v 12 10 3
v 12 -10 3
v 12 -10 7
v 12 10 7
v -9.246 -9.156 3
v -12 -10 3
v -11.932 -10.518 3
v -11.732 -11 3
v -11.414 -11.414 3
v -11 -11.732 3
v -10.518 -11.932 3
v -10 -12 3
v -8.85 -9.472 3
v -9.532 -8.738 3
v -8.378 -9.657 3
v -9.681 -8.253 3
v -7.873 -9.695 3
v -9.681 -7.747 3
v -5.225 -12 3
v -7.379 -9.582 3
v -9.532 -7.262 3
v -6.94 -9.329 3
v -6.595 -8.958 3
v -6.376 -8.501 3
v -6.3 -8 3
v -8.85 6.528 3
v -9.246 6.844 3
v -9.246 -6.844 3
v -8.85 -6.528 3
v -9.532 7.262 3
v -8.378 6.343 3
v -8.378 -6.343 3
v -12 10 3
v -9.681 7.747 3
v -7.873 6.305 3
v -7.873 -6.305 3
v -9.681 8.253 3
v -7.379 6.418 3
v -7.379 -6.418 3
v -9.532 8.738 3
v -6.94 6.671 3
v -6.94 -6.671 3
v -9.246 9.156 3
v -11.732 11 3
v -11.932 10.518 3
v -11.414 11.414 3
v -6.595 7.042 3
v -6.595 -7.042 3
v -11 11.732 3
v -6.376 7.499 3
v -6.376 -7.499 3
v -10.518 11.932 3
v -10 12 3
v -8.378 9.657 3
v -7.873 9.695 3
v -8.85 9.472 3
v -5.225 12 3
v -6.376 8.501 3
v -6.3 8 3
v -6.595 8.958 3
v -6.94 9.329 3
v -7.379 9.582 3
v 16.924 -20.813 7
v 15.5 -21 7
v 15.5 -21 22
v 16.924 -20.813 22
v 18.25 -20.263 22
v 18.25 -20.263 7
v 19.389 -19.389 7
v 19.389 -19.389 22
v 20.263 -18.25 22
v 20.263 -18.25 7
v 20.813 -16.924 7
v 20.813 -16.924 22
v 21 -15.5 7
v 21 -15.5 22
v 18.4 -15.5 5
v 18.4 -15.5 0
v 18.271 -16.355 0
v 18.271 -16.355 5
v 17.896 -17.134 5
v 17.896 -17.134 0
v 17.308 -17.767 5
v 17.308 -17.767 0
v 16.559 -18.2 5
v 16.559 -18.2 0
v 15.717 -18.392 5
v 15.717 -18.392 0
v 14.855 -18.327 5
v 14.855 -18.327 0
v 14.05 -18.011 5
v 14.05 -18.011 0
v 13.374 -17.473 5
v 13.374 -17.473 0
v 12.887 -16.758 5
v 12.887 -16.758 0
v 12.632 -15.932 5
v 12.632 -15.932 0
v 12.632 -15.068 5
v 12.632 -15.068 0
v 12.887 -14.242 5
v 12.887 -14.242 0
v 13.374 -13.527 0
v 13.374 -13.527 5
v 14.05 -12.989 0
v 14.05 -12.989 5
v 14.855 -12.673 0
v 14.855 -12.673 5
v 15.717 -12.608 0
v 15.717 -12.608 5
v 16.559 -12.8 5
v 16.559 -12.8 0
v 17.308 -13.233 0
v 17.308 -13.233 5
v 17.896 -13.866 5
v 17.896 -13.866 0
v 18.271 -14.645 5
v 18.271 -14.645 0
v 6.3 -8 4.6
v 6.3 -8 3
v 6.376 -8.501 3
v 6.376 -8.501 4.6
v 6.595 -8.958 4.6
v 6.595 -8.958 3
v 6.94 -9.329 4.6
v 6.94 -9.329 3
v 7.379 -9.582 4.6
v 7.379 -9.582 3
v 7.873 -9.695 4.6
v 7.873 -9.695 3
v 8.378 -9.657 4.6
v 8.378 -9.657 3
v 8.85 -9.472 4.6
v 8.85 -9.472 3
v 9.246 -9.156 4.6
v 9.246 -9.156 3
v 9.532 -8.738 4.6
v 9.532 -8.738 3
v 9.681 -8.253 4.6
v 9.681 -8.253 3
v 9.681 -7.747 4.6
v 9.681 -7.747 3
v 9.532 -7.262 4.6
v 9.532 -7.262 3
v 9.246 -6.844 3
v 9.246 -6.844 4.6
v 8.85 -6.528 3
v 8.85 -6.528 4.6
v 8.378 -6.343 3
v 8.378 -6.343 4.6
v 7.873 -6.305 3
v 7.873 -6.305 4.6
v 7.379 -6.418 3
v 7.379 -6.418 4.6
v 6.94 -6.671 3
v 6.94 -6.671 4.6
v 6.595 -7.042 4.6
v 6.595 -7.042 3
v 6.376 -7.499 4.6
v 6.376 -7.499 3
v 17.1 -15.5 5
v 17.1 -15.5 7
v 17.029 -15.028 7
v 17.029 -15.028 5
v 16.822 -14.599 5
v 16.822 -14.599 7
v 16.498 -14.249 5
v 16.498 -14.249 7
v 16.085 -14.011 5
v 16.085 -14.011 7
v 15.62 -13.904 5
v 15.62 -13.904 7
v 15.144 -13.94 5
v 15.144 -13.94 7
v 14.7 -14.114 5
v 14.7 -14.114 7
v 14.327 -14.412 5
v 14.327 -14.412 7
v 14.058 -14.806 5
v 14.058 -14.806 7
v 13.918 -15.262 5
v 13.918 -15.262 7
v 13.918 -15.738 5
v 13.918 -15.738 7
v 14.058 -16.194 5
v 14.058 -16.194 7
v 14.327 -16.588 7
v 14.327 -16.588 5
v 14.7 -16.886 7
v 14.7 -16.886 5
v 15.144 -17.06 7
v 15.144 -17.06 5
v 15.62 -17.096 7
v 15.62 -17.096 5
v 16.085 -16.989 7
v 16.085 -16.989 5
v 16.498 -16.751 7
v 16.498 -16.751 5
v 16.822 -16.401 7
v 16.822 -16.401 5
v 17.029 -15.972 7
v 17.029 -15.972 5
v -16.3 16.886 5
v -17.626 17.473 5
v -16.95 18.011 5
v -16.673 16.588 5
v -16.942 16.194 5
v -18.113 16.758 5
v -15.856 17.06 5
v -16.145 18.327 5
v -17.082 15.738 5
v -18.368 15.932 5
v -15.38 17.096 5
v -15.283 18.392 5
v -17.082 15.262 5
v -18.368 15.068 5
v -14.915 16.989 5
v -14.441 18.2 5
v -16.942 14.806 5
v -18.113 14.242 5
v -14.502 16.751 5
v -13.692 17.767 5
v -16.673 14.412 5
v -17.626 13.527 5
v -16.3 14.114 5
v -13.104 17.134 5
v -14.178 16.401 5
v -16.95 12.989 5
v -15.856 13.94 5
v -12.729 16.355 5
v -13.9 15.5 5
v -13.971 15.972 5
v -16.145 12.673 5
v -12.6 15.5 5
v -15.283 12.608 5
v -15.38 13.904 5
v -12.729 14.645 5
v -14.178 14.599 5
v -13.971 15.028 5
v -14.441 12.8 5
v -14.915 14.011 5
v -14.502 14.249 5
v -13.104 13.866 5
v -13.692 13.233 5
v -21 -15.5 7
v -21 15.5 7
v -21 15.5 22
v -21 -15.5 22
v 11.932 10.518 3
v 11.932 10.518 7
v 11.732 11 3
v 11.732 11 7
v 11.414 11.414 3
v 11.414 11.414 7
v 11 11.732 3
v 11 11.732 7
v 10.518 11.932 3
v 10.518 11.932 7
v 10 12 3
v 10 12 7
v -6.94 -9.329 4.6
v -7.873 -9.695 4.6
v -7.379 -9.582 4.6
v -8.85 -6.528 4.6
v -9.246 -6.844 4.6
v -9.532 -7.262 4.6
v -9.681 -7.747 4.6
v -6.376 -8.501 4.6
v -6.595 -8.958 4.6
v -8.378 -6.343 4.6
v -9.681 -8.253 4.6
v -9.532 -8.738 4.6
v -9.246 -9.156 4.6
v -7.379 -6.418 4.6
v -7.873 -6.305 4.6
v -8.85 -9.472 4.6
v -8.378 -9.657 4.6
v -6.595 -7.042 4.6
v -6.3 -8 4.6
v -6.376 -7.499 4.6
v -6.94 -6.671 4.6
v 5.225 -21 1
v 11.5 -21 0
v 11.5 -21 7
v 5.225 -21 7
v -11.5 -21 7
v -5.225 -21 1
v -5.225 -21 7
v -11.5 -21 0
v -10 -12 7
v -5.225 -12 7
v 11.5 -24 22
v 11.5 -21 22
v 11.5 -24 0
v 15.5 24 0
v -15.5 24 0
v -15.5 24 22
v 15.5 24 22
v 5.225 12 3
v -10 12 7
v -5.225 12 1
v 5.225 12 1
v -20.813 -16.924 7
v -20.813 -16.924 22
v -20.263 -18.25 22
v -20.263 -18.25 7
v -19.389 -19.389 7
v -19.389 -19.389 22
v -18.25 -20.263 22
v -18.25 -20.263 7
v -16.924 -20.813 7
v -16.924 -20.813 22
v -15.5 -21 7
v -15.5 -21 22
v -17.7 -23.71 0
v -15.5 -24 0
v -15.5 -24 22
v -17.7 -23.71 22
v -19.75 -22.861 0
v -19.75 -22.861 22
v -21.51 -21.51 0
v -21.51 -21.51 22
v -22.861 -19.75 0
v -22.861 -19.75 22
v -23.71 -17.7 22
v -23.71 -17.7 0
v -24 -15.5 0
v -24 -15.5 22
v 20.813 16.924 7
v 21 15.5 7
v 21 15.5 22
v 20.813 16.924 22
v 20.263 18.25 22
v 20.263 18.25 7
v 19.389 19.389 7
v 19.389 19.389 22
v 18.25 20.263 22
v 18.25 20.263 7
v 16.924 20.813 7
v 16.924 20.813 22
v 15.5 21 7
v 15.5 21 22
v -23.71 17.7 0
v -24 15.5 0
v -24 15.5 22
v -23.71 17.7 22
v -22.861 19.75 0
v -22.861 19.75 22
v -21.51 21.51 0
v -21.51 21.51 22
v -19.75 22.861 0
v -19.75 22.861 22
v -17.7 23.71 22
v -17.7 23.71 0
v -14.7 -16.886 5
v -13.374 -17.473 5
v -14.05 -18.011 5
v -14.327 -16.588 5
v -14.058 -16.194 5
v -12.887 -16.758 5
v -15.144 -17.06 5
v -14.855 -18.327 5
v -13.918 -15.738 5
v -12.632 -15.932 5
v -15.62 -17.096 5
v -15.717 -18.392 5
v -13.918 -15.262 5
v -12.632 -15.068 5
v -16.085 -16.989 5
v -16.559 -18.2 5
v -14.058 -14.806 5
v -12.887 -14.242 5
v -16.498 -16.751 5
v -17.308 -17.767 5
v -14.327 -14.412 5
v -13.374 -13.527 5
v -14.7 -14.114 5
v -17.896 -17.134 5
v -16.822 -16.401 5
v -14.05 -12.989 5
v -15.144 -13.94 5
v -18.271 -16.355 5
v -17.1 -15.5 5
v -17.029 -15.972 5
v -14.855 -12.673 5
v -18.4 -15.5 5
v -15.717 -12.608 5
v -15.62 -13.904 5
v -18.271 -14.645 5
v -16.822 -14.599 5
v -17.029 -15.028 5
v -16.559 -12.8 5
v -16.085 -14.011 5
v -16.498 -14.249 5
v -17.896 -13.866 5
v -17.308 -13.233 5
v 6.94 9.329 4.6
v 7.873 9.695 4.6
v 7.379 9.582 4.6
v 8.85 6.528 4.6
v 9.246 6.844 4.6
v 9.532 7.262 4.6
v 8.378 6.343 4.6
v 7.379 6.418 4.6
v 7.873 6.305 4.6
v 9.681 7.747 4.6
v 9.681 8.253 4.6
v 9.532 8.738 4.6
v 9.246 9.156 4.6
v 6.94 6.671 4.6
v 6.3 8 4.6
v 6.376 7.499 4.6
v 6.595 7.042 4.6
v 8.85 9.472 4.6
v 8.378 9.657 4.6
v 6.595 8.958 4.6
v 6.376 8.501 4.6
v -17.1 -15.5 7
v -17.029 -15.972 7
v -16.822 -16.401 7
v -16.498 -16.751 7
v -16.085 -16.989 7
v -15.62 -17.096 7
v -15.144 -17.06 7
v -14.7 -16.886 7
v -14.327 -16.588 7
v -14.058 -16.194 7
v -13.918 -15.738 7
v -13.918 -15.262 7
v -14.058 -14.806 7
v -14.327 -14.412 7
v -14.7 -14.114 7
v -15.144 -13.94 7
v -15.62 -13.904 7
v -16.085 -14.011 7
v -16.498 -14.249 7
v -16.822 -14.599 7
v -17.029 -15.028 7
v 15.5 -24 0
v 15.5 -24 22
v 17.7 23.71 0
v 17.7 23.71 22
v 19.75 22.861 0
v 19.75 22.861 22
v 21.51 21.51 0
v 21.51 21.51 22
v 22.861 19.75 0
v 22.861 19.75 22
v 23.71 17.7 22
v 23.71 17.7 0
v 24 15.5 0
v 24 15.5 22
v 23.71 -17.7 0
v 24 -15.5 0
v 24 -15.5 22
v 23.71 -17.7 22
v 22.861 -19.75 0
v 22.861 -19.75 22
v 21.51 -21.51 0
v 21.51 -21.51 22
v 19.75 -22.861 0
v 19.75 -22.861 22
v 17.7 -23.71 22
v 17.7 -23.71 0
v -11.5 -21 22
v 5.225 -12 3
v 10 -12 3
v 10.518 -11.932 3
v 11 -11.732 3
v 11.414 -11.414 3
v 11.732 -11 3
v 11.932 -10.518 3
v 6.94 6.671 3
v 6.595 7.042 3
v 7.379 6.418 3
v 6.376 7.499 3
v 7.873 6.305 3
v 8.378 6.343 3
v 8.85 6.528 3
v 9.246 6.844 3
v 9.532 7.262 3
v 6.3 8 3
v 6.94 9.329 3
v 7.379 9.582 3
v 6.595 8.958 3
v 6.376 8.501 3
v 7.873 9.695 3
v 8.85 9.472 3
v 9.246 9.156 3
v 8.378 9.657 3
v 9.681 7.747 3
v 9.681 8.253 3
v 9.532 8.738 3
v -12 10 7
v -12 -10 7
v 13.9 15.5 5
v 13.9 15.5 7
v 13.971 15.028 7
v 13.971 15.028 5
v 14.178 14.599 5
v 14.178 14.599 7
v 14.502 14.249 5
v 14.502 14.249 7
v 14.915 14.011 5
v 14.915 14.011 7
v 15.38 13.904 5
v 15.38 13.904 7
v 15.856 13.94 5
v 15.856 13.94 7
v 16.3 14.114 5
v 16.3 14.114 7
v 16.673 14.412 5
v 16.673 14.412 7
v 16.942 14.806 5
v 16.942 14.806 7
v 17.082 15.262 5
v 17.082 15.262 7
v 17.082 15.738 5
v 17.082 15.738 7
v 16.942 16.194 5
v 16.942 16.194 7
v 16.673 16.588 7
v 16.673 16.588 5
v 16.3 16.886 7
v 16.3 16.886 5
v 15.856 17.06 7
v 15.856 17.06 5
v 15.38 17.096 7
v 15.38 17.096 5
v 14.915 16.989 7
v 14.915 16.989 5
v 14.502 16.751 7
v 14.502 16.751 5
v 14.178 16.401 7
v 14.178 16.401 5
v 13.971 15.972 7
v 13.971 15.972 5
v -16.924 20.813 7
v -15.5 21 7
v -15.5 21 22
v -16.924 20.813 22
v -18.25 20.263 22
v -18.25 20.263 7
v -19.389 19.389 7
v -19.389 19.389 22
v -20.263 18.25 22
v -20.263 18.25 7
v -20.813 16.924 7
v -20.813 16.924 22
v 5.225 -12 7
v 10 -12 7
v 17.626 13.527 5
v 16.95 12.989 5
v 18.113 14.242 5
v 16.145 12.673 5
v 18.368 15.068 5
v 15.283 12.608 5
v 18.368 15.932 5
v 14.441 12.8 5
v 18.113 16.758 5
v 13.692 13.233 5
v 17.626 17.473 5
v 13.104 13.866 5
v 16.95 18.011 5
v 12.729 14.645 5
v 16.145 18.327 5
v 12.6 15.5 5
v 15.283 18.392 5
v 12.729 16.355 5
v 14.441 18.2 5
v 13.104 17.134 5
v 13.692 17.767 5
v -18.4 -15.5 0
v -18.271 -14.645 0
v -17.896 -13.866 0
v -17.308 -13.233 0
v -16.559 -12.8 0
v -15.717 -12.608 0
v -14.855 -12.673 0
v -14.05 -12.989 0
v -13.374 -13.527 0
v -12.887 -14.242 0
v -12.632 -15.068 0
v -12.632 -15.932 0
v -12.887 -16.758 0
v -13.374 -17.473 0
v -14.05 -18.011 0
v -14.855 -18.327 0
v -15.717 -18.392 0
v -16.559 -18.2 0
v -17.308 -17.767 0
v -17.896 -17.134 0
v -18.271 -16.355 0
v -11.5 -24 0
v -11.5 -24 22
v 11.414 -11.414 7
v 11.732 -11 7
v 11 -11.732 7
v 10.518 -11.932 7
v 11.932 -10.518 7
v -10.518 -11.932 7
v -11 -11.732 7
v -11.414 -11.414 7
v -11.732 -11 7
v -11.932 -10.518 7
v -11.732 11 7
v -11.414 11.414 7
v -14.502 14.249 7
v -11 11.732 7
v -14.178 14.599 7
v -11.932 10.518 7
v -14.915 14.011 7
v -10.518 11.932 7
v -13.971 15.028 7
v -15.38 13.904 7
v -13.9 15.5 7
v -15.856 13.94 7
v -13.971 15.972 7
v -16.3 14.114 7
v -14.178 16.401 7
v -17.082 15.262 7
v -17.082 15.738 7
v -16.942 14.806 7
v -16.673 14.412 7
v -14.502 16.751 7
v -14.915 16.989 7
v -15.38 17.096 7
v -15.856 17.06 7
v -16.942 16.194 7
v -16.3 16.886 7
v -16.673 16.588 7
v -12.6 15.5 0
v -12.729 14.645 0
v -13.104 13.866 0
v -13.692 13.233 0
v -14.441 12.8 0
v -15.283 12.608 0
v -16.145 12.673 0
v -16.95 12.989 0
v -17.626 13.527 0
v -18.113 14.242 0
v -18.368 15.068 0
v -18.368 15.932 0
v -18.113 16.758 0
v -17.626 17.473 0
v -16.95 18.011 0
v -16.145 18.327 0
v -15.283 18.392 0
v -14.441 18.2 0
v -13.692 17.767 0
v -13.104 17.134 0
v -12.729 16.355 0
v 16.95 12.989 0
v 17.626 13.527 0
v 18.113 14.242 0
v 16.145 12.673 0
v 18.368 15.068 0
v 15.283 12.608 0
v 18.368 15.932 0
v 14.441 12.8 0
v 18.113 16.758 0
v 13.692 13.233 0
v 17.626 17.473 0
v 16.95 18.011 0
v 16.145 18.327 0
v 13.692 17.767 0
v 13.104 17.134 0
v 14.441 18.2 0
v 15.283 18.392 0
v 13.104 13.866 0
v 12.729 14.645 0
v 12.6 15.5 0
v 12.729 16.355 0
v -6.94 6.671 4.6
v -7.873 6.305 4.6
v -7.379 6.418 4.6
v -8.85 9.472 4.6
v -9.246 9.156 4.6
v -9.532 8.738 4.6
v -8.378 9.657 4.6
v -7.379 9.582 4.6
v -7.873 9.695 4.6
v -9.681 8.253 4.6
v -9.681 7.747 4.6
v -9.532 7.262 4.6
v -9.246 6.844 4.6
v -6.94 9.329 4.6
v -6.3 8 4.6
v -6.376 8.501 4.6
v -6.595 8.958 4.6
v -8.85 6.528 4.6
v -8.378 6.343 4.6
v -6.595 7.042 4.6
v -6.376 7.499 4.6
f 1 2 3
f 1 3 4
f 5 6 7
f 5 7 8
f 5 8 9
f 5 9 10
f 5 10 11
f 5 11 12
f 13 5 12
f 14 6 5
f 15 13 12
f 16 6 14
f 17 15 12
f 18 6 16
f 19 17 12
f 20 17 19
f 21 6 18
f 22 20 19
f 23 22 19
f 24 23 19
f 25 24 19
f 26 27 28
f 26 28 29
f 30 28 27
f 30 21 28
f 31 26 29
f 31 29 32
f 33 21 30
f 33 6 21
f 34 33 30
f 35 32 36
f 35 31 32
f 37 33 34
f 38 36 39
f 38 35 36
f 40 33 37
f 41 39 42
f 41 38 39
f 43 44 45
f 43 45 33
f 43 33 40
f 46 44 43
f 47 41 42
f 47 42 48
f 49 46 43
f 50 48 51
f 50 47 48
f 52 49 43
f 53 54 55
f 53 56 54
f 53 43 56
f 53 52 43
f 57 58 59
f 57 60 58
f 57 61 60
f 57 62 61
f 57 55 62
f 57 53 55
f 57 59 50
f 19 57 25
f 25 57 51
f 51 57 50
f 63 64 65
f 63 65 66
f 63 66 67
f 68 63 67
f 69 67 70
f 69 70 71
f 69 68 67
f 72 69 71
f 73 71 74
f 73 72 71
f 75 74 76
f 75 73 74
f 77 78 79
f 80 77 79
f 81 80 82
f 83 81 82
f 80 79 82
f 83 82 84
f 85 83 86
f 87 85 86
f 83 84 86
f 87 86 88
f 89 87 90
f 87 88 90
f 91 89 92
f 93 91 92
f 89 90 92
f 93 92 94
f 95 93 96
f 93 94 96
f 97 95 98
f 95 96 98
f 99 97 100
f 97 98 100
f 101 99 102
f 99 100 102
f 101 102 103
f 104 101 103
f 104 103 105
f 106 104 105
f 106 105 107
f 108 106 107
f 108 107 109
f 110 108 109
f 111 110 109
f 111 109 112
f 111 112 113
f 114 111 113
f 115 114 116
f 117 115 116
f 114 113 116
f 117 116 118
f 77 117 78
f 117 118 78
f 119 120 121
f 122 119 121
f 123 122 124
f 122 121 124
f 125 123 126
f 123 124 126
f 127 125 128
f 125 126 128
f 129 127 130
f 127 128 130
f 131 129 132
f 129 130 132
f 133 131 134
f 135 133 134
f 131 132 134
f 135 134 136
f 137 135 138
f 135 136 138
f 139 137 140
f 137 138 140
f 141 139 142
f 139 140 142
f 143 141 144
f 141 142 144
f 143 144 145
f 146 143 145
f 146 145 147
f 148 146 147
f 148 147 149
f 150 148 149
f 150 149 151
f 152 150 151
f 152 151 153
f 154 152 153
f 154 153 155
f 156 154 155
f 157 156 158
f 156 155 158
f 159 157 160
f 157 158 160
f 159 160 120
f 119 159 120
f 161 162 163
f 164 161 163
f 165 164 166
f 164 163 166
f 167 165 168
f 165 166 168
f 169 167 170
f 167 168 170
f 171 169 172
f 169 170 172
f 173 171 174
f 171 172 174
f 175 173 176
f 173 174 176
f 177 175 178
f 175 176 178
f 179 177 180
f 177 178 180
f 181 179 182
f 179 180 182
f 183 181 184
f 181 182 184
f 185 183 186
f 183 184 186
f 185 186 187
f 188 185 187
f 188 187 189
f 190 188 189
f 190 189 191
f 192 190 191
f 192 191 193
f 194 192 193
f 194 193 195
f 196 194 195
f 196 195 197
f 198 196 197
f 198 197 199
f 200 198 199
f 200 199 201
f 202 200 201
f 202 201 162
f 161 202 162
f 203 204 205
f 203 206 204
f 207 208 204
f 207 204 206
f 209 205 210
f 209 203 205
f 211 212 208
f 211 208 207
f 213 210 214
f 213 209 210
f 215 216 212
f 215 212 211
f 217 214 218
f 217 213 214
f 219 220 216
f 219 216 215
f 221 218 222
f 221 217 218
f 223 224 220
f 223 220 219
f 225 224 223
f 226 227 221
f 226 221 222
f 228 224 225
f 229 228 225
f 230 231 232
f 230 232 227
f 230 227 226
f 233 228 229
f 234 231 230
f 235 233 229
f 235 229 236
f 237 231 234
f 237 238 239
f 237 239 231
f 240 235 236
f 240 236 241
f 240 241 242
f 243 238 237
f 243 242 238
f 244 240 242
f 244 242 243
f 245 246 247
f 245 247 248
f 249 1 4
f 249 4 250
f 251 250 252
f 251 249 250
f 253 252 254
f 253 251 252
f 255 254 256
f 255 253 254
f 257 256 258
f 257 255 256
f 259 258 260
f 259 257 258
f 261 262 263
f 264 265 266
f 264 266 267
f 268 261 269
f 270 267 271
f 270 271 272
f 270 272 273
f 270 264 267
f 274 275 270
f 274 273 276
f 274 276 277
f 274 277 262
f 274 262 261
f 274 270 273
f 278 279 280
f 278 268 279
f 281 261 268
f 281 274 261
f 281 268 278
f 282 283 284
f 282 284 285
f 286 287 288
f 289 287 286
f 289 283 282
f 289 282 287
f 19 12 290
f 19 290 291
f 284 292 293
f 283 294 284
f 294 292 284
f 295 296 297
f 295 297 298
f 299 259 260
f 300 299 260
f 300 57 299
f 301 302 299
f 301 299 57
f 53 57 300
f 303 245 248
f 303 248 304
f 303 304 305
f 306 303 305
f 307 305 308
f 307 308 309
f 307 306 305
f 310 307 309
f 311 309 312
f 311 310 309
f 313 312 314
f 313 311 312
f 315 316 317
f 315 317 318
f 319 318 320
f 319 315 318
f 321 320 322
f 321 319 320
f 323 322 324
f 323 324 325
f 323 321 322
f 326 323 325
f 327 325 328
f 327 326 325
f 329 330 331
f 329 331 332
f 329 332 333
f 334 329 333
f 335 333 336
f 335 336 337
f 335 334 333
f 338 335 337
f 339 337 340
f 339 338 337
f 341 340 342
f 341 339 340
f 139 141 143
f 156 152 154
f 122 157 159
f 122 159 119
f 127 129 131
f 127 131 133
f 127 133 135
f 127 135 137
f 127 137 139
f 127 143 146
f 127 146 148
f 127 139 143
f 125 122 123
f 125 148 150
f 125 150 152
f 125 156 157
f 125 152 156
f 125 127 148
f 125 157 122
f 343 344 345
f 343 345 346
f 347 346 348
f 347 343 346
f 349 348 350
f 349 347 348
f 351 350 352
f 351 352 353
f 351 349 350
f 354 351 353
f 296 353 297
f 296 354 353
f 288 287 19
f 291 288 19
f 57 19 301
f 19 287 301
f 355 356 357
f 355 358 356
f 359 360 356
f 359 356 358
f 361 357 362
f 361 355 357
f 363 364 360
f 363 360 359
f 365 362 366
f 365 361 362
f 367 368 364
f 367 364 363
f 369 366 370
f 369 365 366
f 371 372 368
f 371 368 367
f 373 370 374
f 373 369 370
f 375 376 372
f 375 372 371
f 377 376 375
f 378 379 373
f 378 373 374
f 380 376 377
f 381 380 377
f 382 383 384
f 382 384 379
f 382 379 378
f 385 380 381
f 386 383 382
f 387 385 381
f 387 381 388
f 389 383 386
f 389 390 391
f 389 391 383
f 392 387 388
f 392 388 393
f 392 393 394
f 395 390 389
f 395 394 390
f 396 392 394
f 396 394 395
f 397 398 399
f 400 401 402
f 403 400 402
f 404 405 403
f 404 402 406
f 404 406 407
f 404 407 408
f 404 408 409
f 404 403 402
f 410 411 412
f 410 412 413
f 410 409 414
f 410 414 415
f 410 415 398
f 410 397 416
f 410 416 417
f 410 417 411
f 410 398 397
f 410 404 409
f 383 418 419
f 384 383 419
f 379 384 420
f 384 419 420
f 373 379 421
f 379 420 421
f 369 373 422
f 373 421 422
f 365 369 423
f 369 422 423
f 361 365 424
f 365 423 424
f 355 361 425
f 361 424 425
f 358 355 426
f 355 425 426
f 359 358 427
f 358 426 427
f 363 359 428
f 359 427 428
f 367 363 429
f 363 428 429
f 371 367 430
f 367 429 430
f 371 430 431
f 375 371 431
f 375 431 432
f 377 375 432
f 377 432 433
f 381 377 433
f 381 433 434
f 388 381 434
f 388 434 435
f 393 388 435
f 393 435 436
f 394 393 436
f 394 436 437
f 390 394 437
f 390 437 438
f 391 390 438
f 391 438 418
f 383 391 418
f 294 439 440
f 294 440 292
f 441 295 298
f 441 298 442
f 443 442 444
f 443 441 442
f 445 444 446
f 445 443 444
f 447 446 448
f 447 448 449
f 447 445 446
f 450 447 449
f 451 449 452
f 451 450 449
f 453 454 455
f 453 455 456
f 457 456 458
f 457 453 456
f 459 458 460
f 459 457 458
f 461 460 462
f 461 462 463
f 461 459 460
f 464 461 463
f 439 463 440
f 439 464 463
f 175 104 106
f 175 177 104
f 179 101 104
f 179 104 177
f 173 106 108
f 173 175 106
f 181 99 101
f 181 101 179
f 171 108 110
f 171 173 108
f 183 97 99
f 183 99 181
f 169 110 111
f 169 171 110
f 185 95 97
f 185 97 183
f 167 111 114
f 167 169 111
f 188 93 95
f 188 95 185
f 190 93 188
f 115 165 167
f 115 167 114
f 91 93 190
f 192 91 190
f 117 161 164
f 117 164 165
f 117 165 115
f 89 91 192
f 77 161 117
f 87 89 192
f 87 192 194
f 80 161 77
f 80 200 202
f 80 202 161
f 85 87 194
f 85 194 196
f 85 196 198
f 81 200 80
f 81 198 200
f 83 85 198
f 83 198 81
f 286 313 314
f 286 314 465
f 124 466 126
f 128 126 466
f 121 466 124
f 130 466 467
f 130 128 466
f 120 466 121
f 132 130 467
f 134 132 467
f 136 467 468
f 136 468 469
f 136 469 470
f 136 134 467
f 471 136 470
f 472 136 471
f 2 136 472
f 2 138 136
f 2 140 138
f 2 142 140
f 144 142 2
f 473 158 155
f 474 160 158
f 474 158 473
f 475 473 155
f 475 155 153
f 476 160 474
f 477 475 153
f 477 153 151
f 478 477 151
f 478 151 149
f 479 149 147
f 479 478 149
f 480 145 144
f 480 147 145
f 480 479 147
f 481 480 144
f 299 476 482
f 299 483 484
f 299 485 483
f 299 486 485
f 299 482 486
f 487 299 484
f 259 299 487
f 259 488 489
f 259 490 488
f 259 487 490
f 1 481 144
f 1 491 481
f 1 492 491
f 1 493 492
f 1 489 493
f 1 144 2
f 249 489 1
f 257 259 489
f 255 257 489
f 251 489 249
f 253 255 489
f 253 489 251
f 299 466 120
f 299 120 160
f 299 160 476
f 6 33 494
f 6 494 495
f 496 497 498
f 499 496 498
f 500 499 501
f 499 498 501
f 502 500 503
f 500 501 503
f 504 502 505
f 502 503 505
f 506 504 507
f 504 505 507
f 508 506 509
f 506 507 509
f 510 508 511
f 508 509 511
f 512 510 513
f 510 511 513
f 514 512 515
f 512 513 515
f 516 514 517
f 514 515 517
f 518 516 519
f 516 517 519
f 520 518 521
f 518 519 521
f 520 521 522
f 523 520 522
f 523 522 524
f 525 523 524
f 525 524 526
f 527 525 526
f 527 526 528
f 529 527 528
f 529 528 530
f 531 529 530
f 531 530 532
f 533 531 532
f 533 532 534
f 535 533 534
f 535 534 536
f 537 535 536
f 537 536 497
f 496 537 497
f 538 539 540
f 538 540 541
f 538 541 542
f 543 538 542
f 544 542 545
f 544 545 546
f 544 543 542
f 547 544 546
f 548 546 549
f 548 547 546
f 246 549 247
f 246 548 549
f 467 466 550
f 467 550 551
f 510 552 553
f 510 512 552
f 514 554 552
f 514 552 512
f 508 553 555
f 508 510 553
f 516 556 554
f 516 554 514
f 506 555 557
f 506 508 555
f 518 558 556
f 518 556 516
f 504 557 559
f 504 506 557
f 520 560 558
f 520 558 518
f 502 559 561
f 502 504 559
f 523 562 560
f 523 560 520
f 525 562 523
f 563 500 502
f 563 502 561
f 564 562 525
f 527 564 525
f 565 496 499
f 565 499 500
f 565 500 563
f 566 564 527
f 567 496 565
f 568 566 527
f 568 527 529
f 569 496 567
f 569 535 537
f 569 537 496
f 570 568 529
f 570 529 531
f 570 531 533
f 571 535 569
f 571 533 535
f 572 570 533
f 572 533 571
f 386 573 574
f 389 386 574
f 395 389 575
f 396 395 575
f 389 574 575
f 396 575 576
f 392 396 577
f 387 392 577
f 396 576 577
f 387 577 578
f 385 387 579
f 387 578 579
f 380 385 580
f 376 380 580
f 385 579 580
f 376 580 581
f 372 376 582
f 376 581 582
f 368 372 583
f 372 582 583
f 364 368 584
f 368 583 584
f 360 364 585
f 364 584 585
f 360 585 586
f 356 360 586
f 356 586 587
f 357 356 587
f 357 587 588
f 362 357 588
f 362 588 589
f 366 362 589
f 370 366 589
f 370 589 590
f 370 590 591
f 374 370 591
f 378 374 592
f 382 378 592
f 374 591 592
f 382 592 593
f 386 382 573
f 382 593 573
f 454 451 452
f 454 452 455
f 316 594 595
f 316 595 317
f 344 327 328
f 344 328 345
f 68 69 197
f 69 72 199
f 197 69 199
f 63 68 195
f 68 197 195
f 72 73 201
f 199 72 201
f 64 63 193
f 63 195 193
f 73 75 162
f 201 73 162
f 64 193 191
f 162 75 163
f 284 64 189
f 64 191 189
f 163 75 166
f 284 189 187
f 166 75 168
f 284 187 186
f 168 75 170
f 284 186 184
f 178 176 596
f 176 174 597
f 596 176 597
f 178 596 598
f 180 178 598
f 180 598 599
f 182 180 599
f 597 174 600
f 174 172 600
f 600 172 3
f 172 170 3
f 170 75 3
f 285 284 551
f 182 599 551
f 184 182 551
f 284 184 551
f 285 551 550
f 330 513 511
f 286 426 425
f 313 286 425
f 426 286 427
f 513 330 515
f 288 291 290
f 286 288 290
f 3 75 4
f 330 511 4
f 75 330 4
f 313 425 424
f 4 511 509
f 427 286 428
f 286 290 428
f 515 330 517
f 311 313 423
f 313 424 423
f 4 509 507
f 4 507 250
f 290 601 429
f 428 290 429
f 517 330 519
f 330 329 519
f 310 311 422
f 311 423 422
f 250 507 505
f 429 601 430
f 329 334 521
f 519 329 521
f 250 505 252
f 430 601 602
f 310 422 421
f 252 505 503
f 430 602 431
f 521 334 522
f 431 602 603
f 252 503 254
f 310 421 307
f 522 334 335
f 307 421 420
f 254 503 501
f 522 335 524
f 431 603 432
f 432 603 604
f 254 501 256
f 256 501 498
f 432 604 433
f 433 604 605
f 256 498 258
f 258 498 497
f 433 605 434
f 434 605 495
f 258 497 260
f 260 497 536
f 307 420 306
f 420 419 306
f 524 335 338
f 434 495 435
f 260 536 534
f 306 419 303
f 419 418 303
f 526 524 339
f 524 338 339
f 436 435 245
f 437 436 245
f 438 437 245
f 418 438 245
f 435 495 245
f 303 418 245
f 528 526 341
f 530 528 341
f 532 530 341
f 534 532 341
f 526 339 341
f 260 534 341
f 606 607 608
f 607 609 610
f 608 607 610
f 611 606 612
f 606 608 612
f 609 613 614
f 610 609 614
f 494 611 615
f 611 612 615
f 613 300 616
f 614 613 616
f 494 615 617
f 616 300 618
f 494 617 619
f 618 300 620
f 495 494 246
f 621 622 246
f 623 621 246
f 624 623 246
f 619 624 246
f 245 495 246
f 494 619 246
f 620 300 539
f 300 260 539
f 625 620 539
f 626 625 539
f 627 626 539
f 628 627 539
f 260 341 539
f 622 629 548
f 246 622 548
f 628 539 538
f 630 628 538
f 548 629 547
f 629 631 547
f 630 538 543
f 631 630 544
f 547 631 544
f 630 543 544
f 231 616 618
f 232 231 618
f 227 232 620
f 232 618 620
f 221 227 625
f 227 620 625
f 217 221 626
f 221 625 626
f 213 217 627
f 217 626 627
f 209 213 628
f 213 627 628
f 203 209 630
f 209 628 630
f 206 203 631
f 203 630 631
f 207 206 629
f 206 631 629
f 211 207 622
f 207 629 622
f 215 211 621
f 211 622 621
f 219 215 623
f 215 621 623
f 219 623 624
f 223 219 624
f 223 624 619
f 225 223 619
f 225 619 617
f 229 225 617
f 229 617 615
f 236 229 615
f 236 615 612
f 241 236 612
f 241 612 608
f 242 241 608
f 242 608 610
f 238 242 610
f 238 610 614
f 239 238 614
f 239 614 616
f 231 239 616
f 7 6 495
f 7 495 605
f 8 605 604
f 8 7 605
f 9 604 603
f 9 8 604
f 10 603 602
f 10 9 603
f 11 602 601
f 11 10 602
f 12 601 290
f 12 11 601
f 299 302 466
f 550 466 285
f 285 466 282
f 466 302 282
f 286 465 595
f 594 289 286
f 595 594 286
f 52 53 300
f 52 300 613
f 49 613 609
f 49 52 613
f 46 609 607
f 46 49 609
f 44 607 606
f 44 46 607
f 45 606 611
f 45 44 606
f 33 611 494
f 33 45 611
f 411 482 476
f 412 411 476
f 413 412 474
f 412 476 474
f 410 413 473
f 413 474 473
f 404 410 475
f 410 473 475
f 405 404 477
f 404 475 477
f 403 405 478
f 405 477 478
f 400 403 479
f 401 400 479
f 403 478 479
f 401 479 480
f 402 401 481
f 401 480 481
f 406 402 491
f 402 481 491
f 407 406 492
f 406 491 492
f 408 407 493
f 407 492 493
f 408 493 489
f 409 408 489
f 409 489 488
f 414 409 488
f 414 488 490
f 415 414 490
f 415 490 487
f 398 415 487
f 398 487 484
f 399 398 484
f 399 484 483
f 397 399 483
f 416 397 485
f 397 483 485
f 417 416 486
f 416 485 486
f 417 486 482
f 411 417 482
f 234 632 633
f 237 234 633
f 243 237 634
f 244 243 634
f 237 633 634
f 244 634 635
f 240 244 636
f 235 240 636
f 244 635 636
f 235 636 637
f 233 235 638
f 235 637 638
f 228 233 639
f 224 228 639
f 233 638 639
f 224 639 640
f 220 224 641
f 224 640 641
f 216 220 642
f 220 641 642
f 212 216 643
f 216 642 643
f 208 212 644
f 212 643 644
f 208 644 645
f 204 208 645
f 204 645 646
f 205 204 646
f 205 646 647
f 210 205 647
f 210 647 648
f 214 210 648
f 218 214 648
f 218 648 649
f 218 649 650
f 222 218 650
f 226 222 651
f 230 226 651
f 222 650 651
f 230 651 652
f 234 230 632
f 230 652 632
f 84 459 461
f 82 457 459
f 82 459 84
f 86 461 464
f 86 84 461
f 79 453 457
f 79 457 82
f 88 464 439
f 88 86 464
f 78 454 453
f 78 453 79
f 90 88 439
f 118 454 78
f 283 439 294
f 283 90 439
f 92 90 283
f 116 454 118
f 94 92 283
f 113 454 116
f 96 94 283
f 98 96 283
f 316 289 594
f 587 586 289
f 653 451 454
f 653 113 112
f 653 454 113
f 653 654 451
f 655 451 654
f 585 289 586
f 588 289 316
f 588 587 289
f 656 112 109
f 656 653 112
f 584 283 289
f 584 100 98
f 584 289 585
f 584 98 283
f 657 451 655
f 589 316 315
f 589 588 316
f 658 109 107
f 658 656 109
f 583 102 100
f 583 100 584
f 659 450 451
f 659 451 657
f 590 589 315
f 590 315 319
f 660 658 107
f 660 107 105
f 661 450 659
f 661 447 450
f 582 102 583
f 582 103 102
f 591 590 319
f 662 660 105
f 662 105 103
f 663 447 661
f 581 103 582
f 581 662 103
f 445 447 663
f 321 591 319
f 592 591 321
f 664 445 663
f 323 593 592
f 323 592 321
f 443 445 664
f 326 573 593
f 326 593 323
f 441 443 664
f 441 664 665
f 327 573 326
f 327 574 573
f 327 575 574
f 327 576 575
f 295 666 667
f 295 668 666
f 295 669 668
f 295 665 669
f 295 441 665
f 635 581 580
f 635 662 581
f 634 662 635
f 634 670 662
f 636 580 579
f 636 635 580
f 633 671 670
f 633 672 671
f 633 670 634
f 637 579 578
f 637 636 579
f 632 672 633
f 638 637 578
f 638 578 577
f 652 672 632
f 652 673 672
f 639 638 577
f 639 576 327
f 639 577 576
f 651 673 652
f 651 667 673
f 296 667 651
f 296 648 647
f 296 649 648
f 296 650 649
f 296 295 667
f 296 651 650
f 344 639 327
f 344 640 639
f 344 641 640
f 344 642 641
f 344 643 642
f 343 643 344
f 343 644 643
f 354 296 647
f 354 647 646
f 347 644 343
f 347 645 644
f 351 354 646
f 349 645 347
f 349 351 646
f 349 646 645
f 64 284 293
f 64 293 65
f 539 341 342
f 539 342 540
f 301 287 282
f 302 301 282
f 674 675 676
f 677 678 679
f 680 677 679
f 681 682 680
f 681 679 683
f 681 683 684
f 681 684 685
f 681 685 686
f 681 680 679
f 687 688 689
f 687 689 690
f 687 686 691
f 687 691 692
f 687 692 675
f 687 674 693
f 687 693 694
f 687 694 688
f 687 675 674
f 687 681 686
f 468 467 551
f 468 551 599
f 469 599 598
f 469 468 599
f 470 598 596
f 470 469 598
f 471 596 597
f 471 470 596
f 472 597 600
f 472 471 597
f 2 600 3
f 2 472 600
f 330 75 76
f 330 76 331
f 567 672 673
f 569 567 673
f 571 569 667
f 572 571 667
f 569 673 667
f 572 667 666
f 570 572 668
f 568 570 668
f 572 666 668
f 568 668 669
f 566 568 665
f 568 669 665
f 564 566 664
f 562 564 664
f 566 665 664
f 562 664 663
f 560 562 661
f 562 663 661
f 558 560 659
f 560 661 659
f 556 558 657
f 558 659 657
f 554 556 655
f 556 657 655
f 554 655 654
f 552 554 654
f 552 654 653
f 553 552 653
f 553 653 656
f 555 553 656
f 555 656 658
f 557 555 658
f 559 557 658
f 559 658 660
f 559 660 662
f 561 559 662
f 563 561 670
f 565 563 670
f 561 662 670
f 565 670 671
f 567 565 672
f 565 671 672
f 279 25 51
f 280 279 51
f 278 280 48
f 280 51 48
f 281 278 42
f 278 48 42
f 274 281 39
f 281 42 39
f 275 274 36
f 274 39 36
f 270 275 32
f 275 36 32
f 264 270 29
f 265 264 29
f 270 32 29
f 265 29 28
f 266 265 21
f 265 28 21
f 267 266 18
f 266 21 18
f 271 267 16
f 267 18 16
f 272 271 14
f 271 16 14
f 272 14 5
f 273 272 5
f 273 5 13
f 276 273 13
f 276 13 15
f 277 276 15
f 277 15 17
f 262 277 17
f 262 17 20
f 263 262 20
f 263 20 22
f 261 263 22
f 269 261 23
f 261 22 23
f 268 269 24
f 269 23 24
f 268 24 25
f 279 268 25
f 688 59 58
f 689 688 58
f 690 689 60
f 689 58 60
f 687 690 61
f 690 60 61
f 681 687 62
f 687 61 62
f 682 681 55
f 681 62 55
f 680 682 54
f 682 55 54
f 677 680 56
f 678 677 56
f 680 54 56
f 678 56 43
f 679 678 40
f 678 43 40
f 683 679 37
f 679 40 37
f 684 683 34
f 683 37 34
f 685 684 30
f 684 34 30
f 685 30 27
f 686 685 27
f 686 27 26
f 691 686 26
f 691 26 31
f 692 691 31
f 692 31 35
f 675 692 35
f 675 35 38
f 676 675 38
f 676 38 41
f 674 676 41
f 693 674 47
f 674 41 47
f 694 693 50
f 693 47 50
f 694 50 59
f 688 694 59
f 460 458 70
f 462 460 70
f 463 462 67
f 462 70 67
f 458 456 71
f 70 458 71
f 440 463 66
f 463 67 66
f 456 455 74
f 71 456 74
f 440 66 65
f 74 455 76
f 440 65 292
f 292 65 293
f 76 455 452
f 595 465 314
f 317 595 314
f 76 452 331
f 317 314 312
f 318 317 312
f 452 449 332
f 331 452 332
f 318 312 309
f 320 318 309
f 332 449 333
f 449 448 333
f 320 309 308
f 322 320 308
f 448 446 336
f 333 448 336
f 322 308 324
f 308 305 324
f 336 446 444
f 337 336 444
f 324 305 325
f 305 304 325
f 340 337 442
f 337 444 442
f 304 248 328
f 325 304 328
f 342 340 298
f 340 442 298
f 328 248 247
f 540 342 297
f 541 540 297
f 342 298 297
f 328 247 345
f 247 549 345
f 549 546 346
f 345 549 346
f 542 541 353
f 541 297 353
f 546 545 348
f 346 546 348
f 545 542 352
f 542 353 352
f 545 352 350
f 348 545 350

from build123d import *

# Parameters (mm, degrees)
RESSALTO_EXTRUS_O1_DEPTH = 7
CORTE_EXTRUS_O1_DEPTH    = 31.512292605
RESSALTO_EXTRUS_O2_DEPTH = 3
ESBO_O4_R                = 1.7
RESSALTO_EXTRUS_O3_DEPTH = 1.6
CORTE_EXTRUS_O2_REACH    = 49.476
ESBO_O5_W                = 10.45
ESBO_O5_H                = 6
ESBO_O6_W                = 10.45
ESBO_O6_H                = 24
RESSALTO_EXTRUS_O4_DEPTH = 1
CORTE_EXTRUS_O3_REACH    = 32.512
ESBO_O8_R                = 1.6
ESBO_O11_R               = 2.9
CORTE_EXTRUS_O4_DEPTH    = 5
RESSALTO_EXTRUS_O5_DEPTH = 22


with BuildPart() as part:
    # Esboço1 → Ressalto-extrusão1 (new body)
    with BuildSketch(Plane.XY):
        with BuildLine():
            Line((15.5, -21), (-15.5, -21))
            ThreePointArc((-15.5, -21), (-19.389087297, -19.389087297), (-21, -15.5))
            Line((-21, -15.5), (-21, 15.5))
            ThreePointArc((-21, 15.5), (-19.389087297, 19.389087297), (-15.5, 21))
            Line((-15.5, 21), (15.5, 21))
            ThreePointArc((15.5, 21), (19.389087297, 19.389087297), (21, 15.5))
            Line((21, 15.5), (21, -15.5))
            ThreePointArc((21, -15.5), (19.389087297, -19.389087297), (15.5, -21))
        make_face()
    extrude(amount=RESSALTO_EXTRUS_O1_DEPTH)

    # Esboço2 → Corte-extrusão1 (cut, through all)
    with BuildSketch(Plane(origin=(0, 0, 0), x_dir=(-1, 0, 0), z_dir=(0, 0, -1))):
        with BuildLine():
            Line((10, -12), (-10, -12))
            ThreePointArc((-10, -12), (-11.414213562, -11.414213562), (-12, -10))
            Line((-12, -10), (-12, 10))
            ThreePointArc((-12, 10), (-11.414213562, 11.414213562), (-10, 12))
            Line((-10, 12), (10, 12))
            ThreePointArc((10, 12), (11.414213562, 11.414213562), (12, 10))
            Line((12, 10), (12, -10))
            ThreePointArc((12, -10), (11.414213562, -11.414213562), (10, -12))
        make_face()
    extrude(amount=-CORTE_EXTRUS_O1_DEPTH, mode=Mode.SUBTRACT)

    # Esboço3 → Ressalto-extrusão2 (add)
    with BuildSketch(Plane(origin=(0, 0, 0), x_dir=(-1, 0, 0), z_dir=(0, 0, -1))):
        with BuildLine():
            Line((-5.225, 12), (-5.225, -12))
            Line((-5.225, -12), (-10, -12))
            ThreePointArc((-10, -12), (-11.414213562, -11.414213562), (-12, -10))
            Line((-12, -10), (-12, 10))
            ThreePointArc((-12, 10), (-11.414213562, 11.414213562), (-10, 12))
            Line((-10, 12), (-5.225, 12))
        make_face()
        with BuildLine():
            Line((5.225, 12), (10, 12))
            ThreePointArc((10, 12), (11.414213562, 11.414213562), (12, 10))
            Line((12, 10), (12, -10))
            ThreePointArc((12, -10), (11.414213562, -11.414213562), (10, -12))
            Line((10, -12), (5.225, -12))
            Line((5.225, -12), (5.225, 12))
        make_face()
    extrude(amount=-RESSALTO_EXTRUS_O2_DEPTH)

    # Esboço4 → Ressalto-extrusão3 (add)
    with BuildSketch(Plane.XY.offset(3)):
        with Locations((-8, 8)):
            Circle(ESBO_O4_R)
        with Locations(Location((8, 8, 0), (0, 0, 180))):
            Circle(ESBO_O4_R)
        with Locations(Location((8, -8, 0), (0, 0, 180))):
            Circle(ESBO_O4_R)
        with Locations((-8, -8)):
            Circle(ESBO_O4_R)
    extrude(amount=RESSALTO_EXTRUS_O3_DEPTH)

    # Esboço5 → Corte-extrusão2 (cut, up to next)
    with BuildSketch(Plane.XZ.offset(21), mode=Mode.PRIVATE) as corte_extrus_o2_sk1:
        with Locations((0, 4)):
            Rectangle(ESBO_O5_W, ESBO_O5_H)
    corte_extrus_o2_tool1 = extrude(corte_extrus_o2_sk1.sketch, amount=-CORTE_EXTRUS_O2_REACH, mode=Mode.PRIVATE) & part.part
    add(corte_extrus_o2_tool1.solids().sort_by_distance((0, -21, 4))[0], mode=Mode.SUBTRACT)

    # Esboço6 → Ressalto-extrusão4 (add)
    with BuildSketch(Plane(origin=(0, 0, 0), x_dir=(-1, 0, 0), z_dir=(0, 0, -1))):
        Rectangle(ESBO_O6_W, ESBO_O6_H)
    extrude(amount=-RESSALTO_EXTRUS_O4_DEPTH)

    # Esboço8 → Corte-extrusão3 (cut, up to next)
    with BuildSketch(Plane.XY.offset(7), mode=Mode.PRIVATE) as corte_extrus_o3_sk1:
        with Locations((-15.5, 15.5)):
            Circle(ESBO_O8_R)
    corte_extrus_o3_tool1 = extrude(corte_extrus_o3_sk1.sketch, amount=-CORTE_EXTRUS_O3_REACH, mode=Mode.PRIVATE) & part.part
    # Esboço8 → Corte-extrusão3 (cut, up to next)
    with BuildSketch(Plane.XY.offset(7), mode=Mode.PRIVATE) as corte_extrus_o3_sk2:
        with Locations(Location((15.5, 15.5, 0), (0, 0, 180))):
            Circle(ESBO_O8_R)
    corte_extrus_o3_tool2 = extrude(corte_extrus_o3_sk2.sketch, amount=-CORTE_EXTRUS_O3_REACH, mode=Mode.PRIVATE) & part.part
    # Esboço8 → Corte-extrusão3 (cut, up to next)
    with BuildSketch(Plane.XY.offset(7), mode=Mode.PRIVATE) as corte_extrus_o3_sk3:
        with Locations((15.5, -15.5)):
            Circle(ESBO_O8_R)
    corte_extrus_o3_tool3 = extrude(corte_extrus_o3_sk3.sketch, amount=-CORTE_EXTRUS_O3_REACH, mode=Mode.PRIVATE) & part.part
    # Esboço8 → Corte-extrusão3 (cut, up to next)
    with BuildSketch(Plane.XY.offset(7), mode=Mode.PRIVATE) as corte_extrus_o3_sk4:
        with Locations(Location((-15.5, -15.5, 0), (0, 0, 180))):
            Circle(ESBO_O8_R)
    corte_extrus_o3_tool4 = extrude(corte_extrus_o3_sk4.sketch, amount=-CORTE_EXTRUS_O3_REACH, mode=Mode.PRIVATE) & part.part
    add(corte_extrus_o3_tool1.solids().sort_by_distance((-15.5, 15.5, 7))[0], mode=Mode.SUBTRACT)
    add(corte_extrus_o3_tool2.solids().sort_by_distance((15.5, 15.5, 7))[0], mode=Mode.SUBTRACT)
    add(corte_extrus_o3_tool3.solids().sort_by_distance((15.5, -15.5, 7))[0], mode=Mode.SUBTRACT)
    add(corte_extrus_o3_tool4.solids().sort_by_distance((-15.5, -15.5, 7))[0], mode=Mode.SUBTRACT)

    # Esboço11 → Corte-extrusão4 (cut)
    with BuildSketch(Plane(origin=(0, 0, 0), x_dir=(-1, 0, 0), z_dir=(0, 0, -1))):
        with Locations((-15.5, 15.5)):
            Circle(ESBO_O11_R)
        with Locations(Location((15.5, 15.5, 0), (0, 0, 180))):
            Circle(ESBO_O11_R)
        with Locations((15.5, -15.5)):
            Circle(ESBO_O11_R)
        with Locations(Location((-15.5, -15.5, 0), (0, 0, 180))):
            Circle(ESBO_O11_R)
    extrude(amount=-CORTE_EXTRUS_O4_DEPTH, mode=Mode.SUBTRACT)

    # Esboço13 → Ressalto-extrusão5 (add)
    with BuildSketch(Plane(origin=(0, 0, 0), x_dir=(-1, 0, 0), z_dir=(0, 0, -1))):
        with BuildLine():
            Line((24, -15.5), (24, 15.5))
            ThreePointArc((24, 15.5), (21.51040764, 21.51040764), (15.5, 24))
            Line((15.5, 24), (-15.5, 24))
            ThreePointArc((-15.5, 24), (-21.51040764, 21.51040764), (-24, 15.5))
            Line((-24, 15.5), (-24, -15.5))
            ThreePointArc((-24, -15.5), (-21.51040764, -21.51040764), (-15.5, -24))
            Line((-15.5, -24), (-11.5, -24))
            Line((-11.5, -24), (-11.5, -21))
            Line((-11.5, -21), (-15.5, -21))
            ThreePointArc((-15.5, -21), (-19.389087297, -19.389087297), (-21, -15.5))
            Line((-21, -15.5), (-21, 15.5))
            ThreePointArc((-21, 15.5), (-19.389087297, 19.389087297), (-15.5, 21))
            Line((-15.5, 21), (15.5, 21))
            ThreePointArc((15.5, 21), (19.389087297, 19.389087297), (21, 15.5))
            Line((21, 15.5), (21, -15.5))
            ThreePointArc((21, -15.5), (19.389087297, -19.389087297), (15.5, -21))
            Line((15.5, -21), (11.5, -21))
            Line((11.5, -21), (11.5, -24))
            Line((11.5, -24), (15.5, -24))
            ThreePointArc((15.5, -24), (21.51040764, -21.51040764), (24, -15.5))
        make_face()
    extrude(amount=-RESSALTO_EXTRUS_O5_DEPTH)


solid = part.part
